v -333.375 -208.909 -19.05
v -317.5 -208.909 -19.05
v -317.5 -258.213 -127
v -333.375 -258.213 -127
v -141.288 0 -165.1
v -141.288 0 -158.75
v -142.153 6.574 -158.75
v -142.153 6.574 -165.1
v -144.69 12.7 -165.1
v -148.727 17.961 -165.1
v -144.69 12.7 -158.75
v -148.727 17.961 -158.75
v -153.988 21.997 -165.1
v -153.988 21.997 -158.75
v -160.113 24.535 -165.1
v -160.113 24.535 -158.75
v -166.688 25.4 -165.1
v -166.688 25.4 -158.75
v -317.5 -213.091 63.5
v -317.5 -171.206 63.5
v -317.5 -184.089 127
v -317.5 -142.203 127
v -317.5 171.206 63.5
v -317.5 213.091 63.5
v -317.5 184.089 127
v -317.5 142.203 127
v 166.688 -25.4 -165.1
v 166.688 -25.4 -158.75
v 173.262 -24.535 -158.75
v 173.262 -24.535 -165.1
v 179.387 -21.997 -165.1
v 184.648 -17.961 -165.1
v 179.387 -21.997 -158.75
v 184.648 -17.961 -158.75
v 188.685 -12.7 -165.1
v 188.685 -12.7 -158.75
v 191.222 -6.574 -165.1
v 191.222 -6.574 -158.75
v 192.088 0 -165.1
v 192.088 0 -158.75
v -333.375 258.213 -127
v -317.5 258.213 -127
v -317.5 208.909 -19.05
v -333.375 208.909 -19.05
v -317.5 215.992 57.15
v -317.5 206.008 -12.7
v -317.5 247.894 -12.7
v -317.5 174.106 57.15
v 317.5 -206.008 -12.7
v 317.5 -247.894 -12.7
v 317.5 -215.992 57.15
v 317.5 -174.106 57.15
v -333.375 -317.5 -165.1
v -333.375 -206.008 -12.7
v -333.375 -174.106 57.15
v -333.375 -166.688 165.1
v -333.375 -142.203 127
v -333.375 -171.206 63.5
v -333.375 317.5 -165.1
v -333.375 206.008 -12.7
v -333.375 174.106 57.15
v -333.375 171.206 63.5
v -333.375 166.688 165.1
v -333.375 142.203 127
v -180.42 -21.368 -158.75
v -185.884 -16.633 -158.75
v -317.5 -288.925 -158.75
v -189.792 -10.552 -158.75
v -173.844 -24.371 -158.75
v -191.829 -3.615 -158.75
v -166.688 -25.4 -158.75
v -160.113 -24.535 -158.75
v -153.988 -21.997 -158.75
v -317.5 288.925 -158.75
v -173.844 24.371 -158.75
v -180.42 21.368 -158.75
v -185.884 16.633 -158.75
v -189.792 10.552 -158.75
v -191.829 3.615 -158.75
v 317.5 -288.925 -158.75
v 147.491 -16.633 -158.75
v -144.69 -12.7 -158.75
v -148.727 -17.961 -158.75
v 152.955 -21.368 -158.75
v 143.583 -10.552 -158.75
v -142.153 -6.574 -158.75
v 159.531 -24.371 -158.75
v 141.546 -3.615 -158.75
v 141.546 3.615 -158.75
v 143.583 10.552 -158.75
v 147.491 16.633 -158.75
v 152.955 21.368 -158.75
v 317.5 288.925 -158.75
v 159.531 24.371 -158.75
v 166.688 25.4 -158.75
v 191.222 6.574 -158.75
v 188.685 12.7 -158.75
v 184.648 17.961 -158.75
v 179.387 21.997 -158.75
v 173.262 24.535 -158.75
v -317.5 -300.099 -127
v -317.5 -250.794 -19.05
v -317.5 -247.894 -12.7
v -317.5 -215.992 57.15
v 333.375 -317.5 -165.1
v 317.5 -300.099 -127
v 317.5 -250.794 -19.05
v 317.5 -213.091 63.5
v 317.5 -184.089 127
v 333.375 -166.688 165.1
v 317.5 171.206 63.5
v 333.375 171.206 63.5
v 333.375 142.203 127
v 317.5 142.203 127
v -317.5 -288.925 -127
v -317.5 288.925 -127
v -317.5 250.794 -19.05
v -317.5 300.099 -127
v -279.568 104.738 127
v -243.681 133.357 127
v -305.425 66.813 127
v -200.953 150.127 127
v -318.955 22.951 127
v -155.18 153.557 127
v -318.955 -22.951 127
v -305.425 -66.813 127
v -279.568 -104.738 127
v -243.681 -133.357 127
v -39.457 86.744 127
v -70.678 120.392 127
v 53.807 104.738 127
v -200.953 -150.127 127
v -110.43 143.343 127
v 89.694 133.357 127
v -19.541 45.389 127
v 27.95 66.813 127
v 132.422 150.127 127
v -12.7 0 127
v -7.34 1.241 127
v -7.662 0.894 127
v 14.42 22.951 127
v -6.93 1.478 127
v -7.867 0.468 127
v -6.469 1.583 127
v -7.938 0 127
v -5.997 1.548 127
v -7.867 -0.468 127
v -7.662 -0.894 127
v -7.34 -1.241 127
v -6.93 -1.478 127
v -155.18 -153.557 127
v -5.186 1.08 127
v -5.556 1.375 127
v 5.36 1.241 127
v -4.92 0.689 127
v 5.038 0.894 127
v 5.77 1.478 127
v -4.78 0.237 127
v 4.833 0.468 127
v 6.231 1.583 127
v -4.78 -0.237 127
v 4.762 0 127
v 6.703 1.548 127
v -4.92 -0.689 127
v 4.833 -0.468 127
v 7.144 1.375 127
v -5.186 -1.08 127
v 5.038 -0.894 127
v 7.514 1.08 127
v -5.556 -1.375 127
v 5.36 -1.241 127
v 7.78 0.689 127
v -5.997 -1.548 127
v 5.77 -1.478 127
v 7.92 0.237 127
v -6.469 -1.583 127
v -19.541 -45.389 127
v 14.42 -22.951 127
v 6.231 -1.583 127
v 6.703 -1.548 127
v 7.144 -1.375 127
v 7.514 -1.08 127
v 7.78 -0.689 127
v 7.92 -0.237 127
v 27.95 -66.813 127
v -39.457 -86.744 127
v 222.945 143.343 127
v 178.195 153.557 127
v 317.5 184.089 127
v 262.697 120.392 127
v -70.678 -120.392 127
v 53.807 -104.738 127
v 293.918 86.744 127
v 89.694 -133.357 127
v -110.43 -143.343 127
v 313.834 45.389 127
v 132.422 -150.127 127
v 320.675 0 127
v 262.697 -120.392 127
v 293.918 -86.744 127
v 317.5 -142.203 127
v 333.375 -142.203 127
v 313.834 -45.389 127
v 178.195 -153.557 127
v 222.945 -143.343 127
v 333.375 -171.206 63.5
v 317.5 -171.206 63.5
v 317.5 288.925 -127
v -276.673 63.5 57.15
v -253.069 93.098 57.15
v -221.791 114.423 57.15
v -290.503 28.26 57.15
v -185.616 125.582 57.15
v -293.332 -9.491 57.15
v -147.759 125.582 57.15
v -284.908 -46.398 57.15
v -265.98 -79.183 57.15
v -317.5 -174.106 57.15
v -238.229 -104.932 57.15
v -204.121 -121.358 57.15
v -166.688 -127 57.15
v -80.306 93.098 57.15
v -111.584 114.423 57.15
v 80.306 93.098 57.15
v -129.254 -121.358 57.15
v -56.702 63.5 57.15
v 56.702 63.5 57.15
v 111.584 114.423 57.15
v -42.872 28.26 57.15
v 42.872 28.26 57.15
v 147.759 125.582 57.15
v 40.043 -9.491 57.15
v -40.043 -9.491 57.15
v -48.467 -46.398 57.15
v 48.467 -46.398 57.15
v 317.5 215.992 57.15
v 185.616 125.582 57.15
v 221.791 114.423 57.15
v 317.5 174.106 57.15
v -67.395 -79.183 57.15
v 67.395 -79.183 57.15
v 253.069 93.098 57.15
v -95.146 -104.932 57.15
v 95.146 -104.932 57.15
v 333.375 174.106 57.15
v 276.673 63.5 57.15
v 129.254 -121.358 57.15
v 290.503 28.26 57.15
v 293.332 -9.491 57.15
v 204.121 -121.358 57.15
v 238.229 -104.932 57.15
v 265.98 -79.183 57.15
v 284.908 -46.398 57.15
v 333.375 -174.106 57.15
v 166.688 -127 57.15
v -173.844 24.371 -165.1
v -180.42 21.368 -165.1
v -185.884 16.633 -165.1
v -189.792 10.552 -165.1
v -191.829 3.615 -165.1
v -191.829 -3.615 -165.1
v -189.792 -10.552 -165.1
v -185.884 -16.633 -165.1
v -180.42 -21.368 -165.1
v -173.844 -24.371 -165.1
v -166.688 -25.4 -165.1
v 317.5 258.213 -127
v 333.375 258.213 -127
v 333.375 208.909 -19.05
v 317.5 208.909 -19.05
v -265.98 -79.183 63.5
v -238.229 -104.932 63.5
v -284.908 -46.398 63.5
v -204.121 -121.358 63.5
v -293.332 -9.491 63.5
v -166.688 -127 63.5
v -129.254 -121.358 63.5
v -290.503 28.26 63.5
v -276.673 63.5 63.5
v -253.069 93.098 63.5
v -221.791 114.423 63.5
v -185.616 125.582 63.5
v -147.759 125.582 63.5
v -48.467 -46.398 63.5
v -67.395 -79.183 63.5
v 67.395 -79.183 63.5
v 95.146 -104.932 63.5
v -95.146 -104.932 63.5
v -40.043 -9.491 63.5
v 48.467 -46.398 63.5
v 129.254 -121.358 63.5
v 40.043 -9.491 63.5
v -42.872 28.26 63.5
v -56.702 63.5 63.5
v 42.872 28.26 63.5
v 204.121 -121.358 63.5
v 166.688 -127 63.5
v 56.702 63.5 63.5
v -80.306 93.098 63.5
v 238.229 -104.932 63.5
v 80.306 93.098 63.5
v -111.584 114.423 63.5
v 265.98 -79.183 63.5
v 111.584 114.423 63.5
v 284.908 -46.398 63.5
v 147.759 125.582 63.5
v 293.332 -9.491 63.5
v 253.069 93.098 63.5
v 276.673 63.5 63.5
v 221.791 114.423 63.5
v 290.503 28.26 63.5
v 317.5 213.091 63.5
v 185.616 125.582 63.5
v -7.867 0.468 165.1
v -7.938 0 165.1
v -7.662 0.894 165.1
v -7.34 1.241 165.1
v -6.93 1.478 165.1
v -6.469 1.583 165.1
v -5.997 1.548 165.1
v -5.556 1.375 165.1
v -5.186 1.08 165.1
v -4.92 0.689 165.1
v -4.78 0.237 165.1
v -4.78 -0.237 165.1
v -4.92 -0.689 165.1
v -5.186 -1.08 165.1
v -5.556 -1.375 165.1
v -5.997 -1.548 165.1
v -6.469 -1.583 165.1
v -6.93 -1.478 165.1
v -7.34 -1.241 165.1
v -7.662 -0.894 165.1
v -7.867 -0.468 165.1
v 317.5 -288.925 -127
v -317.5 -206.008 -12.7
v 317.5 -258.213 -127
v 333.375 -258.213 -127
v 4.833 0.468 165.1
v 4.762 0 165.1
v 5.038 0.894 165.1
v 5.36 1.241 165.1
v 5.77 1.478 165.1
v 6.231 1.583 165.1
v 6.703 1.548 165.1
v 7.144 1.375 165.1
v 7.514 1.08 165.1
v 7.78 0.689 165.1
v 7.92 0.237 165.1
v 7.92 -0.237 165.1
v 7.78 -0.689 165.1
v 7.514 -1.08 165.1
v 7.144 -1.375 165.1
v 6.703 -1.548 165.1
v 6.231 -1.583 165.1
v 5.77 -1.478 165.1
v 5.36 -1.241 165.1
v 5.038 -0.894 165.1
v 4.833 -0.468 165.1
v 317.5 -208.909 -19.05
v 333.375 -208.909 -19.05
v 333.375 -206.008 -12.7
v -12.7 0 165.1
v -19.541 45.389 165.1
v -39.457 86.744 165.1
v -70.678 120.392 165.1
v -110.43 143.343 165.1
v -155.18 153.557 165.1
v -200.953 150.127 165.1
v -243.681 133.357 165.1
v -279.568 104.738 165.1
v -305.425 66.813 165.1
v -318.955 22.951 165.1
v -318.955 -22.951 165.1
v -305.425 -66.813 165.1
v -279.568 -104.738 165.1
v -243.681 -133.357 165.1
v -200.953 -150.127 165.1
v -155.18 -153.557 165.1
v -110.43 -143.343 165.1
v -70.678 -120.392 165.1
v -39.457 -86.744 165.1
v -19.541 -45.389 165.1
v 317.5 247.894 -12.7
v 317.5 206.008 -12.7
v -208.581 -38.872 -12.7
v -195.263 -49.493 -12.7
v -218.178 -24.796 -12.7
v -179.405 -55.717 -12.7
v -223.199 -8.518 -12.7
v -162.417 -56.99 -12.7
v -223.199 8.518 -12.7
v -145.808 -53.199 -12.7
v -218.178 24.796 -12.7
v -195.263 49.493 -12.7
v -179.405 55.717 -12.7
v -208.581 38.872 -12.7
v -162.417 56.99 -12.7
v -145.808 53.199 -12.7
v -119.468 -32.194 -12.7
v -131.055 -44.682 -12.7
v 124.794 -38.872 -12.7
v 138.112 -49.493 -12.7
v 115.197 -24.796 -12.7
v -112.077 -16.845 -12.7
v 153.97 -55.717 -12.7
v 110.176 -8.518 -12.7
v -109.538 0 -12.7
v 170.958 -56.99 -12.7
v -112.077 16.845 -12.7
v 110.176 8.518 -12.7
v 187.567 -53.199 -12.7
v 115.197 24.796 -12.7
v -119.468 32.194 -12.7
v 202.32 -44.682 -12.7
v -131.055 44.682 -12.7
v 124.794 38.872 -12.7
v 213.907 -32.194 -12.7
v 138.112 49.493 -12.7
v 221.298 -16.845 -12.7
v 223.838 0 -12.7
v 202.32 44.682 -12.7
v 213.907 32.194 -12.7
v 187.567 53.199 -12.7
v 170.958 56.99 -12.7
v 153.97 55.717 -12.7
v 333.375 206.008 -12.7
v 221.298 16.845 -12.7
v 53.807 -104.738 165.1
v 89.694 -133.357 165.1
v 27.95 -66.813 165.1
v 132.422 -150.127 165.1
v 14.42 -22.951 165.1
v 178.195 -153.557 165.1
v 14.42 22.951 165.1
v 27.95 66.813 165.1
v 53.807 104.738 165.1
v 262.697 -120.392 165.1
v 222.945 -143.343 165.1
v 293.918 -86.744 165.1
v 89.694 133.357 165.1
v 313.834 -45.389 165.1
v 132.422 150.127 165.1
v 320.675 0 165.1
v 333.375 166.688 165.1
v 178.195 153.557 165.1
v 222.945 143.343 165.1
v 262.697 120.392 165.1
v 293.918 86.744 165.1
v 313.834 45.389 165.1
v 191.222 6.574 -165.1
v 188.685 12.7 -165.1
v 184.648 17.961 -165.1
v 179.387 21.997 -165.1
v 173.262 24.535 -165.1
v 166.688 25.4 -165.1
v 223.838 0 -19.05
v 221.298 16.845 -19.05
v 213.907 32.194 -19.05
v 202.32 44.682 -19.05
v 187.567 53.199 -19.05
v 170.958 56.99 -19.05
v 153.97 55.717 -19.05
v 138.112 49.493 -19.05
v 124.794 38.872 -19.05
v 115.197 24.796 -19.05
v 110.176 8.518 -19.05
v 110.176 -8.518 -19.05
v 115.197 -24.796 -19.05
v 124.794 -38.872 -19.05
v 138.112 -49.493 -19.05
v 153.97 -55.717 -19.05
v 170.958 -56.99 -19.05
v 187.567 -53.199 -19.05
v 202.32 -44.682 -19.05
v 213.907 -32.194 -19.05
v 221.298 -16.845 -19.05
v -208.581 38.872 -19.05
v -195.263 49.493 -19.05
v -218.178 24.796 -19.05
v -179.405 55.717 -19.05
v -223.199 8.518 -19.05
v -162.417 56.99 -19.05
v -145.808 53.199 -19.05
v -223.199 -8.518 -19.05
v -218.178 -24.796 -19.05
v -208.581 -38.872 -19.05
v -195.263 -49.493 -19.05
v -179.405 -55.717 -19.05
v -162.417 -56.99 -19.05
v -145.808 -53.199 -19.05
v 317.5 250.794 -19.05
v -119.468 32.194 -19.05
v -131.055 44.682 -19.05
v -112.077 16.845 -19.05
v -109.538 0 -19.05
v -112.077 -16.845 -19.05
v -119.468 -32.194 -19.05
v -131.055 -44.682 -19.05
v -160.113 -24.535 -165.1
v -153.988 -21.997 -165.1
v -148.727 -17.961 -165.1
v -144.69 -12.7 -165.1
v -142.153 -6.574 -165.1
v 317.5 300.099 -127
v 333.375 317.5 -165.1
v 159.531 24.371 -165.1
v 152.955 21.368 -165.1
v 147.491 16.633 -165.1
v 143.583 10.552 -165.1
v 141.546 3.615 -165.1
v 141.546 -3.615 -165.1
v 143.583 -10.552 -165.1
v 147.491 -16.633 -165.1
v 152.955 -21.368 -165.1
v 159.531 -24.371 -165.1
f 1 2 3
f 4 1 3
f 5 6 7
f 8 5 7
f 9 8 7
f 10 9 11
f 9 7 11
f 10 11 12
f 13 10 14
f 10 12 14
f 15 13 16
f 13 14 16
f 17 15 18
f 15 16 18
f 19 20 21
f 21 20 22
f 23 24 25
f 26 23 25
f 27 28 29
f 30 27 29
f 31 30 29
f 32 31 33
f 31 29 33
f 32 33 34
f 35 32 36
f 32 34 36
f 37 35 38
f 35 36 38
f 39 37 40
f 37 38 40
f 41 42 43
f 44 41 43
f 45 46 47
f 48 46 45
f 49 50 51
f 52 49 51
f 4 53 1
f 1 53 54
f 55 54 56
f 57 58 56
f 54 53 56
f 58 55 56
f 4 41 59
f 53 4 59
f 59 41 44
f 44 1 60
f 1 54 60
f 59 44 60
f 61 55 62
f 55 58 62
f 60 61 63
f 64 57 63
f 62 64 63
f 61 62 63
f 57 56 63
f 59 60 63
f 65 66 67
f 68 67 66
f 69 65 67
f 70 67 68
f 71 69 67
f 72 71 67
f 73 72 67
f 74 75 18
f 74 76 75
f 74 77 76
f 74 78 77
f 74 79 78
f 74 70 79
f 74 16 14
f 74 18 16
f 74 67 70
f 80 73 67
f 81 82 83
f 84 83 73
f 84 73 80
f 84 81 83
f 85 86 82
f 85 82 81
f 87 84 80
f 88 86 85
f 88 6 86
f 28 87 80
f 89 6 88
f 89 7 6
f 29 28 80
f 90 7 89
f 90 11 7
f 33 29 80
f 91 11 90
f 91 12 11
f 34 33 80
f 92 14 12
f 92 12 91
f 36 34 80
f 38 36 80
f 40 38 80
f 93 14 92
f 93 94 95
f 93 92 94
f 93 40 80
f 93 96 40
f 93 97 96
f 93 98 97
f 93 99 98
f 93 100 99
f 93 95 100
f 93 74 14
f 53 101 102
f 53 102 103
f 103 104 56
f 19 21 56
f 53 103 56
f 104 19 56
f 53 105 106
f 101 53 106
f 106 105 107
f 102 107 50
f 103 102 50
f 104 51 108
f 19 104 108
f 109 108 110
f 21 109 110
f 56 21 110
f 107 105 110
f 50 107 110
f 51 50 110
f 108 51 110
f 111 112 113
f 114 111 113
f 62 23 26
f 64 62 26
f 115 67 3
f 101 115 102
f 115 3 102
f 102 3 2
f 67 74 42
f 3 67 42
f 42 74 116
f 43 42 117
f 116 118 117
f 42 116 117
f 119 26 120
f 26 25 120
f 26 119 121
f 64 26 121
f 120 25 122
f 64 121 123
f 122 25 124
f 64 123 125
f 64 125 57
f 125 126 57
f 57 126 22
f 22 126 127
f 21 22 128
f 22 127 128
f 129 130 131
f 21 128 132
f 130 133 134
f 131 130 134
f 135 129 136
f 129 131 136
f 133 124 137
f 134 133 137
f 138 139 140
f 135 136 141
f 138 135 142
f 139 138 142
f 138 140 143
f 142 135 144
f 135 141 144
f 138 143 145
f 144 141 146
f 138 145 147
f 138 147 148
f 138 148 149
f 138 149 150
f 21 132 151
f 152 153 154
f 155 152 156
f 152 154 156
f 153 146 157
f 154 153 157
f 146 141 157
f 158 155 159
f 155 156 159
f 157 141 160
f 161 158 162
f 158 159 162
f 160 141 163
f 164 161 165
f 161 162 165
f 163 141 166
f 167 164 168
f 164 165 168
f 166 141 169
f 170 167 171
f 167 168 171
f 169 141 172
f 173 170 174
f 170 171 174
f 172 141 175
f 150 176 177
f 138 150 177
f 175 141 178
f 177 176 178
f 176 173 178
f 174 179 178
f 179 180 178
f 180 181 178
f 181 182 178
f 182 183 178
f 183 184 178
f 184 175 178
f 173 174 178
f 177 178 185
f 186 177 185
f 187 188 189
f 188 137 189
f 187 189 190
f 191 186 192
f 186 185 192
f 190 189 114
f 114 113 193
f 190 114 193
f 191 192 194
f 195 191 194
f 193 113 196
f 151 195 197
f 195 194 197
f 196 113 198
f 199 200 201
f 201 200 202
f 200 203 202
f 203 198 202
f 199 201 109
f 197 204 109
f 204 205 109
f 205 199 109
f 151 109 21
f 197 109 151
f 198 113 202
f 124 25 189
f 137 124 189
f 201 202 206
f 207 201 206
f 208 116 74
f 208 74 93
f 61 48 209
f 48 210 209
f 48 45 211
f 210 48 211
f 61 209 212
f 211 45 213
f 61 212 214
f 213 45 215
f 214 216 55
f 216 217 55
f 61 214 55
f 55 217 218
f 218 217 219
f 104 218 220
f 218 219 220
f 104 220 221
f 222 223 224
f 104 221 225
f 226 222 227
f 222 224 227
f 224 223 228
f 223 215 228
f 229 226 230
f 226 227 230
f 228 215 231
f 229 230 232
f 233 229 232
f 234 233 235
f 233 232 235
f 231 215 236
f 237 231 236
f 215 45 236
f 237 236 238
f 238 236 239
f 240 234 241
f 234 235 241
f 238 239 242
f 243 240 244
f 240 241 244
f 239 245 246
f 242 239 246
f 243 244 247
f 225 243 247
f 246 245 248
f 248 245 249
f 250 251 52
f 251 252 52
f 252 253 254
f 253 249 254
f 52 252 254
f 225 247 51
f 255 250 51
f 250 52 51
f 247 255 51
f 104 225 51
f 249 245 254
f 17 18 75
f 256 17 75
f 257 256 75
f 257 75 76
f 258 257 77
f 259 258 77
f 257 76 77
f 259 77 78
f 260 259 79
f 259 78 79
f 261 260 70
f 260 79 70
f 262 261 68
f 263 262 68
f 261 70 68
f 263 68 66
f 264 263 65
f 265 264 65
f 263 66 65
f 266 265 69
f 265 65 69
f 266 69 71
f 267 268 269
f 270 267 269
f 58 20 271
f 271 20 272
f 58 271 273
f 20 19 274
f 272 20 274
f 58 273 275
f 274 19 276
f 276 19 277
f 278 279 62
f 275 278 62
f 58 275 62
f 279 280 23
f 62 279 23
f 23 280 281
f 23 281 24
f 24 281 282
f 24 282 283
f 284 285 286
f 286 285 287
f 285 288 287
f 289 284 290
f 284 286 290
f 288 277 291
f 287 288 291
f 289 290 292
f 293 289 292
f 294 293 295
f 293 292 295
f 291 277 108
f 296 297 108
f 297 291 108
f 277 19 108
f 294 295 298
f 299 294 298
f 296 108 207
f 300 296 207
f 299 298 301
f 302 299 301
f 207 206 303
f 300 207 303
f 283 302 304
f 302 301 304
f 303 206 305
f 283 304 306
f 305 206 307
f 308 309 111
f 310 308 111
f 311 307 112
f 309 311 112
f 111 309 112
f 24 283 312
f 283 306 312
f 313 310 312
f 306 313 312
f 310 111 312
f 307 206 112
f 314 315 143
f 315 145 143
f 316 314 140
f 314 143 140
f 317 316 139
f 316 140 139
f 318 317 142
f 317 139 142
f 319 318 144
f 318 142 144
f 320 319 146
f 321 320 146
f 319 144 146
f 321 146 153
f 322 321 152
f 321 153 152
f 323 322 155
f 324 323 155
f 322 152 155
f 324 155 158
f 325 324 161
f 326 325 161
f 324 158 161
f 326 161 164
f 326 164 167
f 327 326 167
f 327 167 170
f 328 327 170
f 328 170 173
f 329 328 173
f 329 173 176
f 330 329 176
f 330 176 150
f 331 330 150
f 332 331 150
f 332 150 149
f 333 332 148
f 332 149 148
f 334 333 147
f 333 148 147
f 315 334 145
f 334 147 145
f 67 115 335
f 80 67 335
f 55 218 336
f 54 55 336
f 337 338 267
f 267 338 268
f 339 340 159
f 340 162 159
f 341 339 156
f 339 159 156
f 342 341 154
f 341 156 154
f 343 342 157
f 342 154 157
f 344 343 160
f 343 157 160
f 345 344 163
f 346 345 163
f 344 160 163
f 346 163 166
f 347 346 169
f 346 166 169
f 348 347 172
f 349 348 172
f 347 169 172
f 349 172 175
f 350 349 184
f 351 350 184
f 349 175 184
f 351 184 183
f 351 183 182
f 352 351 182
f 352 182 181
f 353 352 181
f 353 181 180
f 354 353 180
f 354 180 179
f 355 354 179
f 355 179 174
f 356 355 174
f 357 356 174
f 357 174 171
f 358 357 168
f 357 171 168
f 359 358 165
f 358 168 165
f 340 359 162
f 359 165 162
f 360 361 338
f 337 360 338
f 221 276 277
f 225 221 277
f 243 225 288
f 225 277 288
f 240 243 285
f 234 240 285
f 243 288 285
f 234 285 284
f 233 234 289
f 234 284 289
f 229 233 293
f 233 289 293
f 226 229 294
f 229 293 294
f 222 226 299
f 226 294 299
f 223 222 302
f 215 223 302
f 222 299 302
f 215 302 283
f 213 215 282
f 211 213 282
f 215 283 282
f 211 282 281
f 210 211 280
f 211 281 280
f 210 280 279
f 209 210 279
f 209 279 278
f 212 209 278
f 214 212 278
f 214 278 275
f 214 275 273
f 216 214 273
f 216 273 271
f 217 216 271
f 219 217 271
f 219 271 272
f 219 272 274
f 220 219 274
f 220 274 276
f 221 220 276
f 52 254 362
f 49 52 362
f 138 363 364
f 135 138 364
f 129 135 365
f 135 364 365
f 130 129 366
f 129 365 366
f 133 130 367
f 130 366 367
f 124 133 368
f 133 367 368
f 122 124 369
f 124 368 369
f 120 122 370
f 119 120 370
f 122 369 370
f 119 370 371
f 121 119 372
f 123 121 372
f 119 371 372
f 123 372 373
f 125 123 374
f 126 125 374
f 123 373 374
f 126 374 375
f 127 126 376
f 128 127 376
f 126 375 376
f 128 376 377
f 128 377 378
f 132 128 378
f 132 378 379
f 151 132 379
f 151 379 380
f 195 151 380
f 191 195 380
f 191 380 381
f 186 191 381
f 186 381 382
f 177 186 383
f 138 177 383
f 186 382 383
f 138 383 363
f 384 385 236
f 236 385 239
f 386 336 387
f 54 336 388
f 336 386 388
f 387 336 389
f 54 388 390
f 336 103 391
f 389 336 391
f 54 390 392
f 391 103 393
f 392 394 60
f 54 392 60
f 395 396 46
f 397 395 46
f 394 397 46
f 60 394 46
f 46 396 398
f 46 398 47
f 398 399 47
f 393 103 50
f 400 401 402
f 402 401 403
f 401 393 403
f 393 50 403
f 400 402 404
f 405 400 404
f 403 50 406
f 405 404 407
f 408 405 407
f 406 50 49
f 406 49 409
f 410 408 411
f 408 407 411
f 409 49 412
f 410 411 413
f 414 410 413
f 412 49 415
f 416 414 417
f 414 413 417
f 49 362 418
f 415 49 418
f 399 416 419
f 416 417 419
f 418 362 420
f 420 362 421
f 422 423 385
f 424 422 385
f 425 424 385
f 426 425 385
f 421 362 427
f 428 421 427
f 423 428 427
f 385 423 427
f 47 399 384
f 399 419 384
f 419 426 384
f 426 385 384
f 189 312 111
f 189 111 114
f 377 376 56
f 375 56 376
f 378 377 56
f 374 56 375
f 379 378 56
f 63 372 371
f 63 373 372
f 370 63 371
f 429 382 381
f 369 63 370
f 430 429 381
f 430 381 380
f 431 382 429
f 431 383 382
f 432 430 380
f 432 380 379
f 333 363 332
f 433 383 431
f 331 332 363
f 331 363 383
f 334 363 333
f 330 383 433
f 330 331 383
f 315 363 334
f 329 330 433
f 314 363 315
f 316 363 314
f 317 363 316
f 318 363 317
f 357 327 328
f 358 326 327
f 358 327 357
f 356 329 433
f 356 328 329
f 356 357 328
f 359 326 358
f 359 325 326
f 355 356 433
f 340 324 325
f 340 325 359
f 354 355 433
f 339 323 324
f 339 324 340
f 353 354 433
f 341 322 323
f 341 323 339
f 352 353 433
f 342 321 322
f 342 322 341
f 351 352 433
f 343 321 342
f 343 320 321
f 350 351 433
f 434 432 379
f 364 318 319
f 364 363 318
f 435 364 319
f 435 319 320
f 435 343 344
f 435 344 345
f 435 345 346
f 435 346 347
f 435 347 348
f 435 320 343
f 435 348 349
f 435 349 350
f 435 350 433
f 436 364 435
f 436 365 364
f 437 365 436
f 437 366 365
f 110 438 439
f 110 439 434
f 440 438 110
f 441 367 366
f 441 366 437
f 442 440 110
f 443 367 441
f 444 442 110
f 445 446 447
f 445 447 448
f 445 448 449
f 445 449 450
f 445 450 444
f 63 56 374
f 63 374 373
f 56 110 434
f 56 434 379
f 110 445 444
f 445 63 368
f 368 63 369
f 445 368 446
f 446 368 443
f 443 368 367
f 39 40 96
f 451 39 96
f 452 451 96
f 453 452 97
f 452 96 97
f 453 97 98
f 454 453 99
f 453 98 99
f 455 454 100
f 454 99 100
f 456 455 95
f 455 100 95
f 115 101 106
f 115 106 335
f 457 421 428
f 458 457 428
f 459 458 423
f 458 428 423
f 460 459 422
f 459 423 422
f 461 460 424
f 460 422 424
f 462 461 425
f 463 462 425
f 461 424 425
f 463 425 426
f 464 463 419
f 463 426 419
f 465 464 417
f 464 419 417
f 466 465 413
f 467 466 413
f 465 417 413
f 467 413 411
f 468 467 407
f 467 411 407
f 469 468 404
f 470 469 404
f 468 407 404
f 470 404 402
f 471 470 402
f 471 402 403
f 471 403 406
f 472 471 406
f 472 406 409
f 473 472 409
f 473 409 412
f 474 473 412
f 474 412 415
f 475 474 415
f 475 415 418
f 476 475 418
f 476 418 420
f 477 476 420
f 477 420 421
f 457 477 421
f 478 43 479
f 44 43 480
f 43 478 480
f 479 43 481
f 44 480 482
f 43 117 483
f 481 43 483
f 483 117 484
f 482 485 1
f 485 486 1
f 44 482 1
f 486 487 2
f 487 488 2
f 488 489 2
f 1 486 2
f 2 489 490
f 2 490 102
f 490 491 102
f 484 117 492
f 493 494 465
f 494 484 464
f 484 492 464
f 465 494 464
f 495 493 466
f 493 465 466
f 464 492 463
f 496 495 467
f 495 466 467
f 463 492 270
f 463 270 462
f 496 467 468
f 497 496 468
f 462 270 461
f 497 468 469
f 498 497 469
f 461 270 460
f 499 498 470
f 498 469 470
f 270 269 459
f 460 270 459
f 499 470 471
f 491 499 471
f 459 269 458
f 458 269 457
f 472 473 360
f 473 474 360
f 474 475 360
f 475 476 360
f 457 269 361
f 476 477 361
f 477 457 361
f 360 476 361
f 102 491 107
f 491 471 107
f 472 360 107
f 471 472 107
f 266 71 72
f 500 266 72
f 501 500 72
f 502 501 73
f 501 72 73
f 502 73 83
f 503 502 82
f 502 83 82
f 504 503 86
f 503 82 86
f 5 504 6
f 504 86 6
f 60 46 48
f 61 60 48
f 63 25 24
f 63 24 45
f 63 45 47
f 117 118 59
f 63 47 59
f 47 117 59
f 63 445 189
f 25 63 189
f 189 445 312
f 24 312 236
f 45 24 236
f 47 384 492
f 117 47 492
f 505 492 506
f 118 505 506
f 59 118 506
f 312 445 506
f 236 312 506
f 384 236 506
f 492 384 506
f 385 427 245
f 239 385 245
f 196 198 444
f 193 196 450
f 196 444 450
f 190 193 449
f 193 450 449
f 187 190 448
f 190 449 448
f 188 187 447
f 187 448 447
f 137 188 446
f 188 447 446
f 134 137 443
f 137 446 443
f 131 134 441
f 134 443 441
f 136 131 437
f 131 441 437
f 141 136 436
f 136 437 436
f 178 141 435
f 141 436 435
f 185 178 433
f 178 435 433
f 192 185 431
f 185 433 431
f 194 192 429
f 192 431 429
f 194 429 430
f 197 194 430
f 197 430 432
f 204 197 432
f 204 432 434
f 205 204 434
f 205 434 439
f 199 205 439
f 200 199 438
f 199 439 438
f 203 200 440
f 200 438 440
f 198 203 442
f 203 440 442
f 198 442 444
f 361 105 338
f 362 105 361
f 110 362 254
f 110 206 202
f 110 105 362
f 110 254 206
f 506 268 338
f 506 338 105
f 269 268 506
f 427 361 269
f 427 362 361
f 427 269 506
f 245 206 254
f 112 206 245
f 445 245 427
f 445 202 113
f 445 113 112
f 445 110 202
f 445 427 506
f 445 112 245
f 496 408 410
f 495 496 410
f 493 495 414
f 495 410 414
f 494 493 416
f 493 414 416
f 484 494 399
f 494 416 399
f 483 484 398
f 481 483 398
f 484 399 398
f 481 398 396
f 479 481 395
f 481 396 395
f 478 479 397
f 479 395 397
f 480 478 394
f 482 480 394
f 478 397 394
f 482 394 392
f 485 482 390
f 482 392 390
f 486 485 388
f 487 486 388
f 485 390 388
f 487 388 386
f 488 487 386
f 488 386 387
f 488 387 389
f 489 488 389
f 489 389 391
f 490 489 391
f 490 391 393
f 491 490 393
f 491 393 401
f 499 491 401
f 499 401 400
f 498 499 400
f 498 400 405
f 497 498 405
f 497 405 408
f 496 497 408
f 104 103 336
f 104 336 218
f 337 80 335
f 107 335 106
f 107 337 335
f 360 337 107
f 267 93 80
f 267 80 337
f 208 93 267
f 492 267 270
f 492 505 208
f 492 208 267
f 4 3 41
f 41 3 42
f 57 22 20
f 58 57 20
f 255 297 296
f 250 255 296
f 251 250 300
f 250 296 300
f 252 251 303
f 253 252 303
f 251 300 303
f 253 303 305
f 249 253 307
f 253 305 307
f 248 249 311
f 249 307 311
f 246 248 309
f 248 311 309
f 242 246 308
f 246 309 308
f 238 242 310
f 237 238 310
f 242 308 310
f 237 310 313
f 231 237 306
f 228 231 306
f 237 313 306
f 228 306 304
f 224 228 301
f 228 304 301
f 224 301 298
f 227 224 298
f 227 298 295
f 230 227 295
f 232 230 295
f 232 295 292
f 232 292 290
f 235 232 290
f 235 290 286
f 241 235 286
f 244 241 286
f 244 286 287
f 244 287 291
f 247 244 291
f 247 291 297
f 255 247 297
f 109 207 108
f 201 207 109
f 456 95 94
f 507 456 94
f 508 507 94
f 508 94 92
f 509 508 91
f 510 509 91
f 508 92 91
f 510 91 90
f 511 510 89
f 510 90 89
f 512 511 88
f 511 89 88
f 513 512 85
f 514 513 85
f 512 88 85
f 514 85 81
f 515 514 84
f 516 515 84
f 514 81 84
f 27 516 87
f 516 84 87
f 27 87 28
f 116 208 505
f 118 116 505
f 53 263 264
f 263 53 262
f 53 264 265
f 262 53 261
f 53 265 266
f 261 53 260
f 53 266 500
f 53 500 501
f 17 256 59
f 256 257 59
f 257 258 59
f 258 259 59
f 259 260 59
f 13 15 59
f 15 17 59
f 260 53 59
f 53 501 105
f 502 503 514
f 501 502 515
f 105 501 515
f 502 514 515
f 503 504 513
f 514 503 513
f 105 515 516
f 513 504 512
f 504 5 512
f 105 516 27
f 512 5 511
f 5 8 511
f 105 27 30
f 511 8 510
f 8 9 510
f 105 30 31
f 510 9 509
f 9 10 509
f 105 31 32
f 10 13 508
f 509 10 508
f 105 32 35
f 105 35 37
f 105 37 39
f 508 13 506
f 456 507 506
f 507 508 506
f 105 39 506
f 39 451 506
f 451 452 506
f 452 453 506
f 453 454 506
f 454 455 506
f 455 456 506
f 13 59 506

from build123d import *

# Parameters (mm, degrees)
F0_W      = 666.75
F0_H      = 635
F1_DEPTH  = 165.1
F4_W      = 333.375
F4_H      = 69.85
F5_DEPTH  = 666.751
F6_W      = 635
F6_H      = 63.5
F6_H_2    = 107.95
F6_H_3    = 69.85
F7_DEPTH  = 330.2
F9_DEPTH  = 38.1
F11_DEPTH = 25.4
F13_DEPTH = 25.4
F14_W     = 635
F14_H     = 577.849984169
F15_DEPTH = 31.75
F17_DEPTH = 25.4
F19_D     = 3.175
F19_DEPTH = 38.1
F19_TIP   = 0.9538662327


with BuildPart() as f1:
    # F0 (on Top) → F1 (new body, symmetric)
    with BuildSketch(Plane.XY):
        Rectangle(F0_W, F0_H)
    extrude(amount=F1_DEPTH, both=True)

    # F4 (on face) → F5 (cut, through all)
    with BuildSketch(Plane.YZ.offset(333.375)):
        Polygon((0, 127), (-142.2031428718, 127), (-166.6875, 73.3921443929), (-166.6875, 63.5), (166.6875, 63.5), (166.6875, 73.3921443929), (142.2031428718, 127), align=None)
        Polygon((-166.6875, 63.5), (-166.6875, 73.3921443929), (-171.2055467179, 63.5), align=None)
        Polygon((171.2055467179, 63.5), (166.6875, 73.3921443929), (166.6875, 63.5), align=None)
        Polygon((174.1057871025, 57.15), (166.6875, 57.15), (166.6875, -12.7), (206.0084313333, -12.7), align=None)
        with Locations((0, 22.225)):
            Rectangle(F4_W, F4_H)
        Polygon((-166.6875, -12.7), (-166.6875, 57.15), (-174.1057871025, 57.15), (-206.0084313333, -12.7), align=None)
        Polygon((-208.9086717179, -19.05), (-258.2127582564, -127), (-166.6875, -127), (-166.6875, -19.05), align=None)
        Polygon((-166.6875, -19.05), (-166.6875, -127), (0, -127), (166.6875, -127), (166.6875, -19.05), align=None)
        Polygon((166.6875, -19.05), (166.6875, -127), (258.2127582564, -127), (208.9086717179, -19.05), align=None)
        Polygon((317.5, 165.1), (166.6875, 165.1), (184.0889423077, 127), (213.0913461538, 63.5), (317.5, -165.1), align=None)
        Polygon((-184.0889423077, 127), (-166.6875, 165.1), (-317.5, 165.1), (-317.5, -165.1), (-213.0913461538, 63.5), align=None)
    extrude(amount=-F5_DEPTH, mode=Mode.SUBTRACT)

    # F6 (on Front) → F7 (cut, symmetric)
    with BuildSketch(Plane.XZ):
        with Locations((0, 95.25)):
            Rectangle(F6_W, F6_H)
        with Locations((0, -73.025)):
            Rectangle(F6_W, F6_H_2)
        with Locations((0, 22.225)):
            Rectangle(F6_W, F6_H_3)
    extrude(amount=F7_DEPTH, both=True, mode=Mode.SUBTRACT)

    # F3 (on face) + F8 (on face) → F9 (cut)
    with BuildSketch(Plane.XY.offset(165.1)):
        with BuildLine():
            ThreePointArc((-166.6875, 153.9875), (-320.675, 0), (-166.6875, -153.9875))
            Line((-166.6875, -153.9875), (-166.6875, 153.9875))
        make_face()
        with BuildLine():
            Line((-166.6875, 153.9875), (-166.6875, -153.9875))
            ThreePointArc((-166.6875, -153.9875), (-57.801894532, -108.885605468), (-12.7, 0))
            ThreePointArc((-12.7, 0), (-57.801894532, 108.885605468), (-166.6875, 153.9875))
        make_face()
        with BuildLine():
            ThreePointArc((166.6875, 153.9875), (12.7, 0), (166.6875, -153.9875))
            Line((166.6875, -153.9875), (166.6875, 153.9875))
        make_face()
    with BuildSketch(Plane.XY.offset(165.1)):
        with BuildLine():
            Line((166.6875, 153.9875), (166.6875, -153.9875))
            ThreePointArc((166.6875, -153.9875), (275.573105468, -108.885605468), (320.675, 0))
            ThreePointArc((320.675, 0), (275.573105468, 108.885605468), (166.6875, 153.9875))
        make_face()
    extrude(amount=-F9_DEPTH, mode=Mode.SUBTRACT)

    # F10 (on face) → F11 (cut)
    with BuildSketch(Plane.XY.offset(63.5)):
        with BuildLine():
            ThreePointArc((-166.6875, 127), (-293.6875, 0), (-166.6875, -127))
            Line((-166.6875, -127), (-166.6875, 127))
        make_face()
        with BuildLine():
            Line((-166.6875, 127), (-166.6875, -127))
            ThreePointArc((-166.6875, -127), (-76.8849387893, -89.8025612107), (-39.6875, 0))
            ThreePointArc((-39.6875, 0), (-76.8849387893, 89.8025612107), (-166.6875, 127))
        make_face()
        with BuildLine():
            ThreePointArc((166.6875, 127), (39.6875, 0), (166.6875, -127))
            Line((166.6875, -127), (166.6875, 127))
        make_face()
        with BuildLine():
            Line((166.6875, 127), (166.6875, -127))
            ThreePointArc((166.6875, -127), (256.4900612107, -89.8025612107), (293.6875, 0))
            ThreePointArc((293.6875, 0), (256.4900612107, 89.8025612107), (166.6875, 127))
        make_face()
    extrude(amount=-F11_DEPTH, mode=Mode.SUBTRACT)

    # F12 (on face) → F13 (cut)
    with BuildSketch(Plane.XY.offset(-12.7)):
        with BuildLine():
            ThreePointArc((-166.6875, 57.15), (-223.8375, 0), (-166.6875, -57.15))
            Line((-166.6875, -57.15), (-166.6875, 57.15))
        make_face()
        with BuildLine():
            Line((-166.6875, 57.15), (-166.6875, -57.15))
            ThreePointArc((-166.6875, -57.15), (-126.2763474552, -40.4111525448), (-109.5375, 0))
            ThreePointArc((-109.5375, 0), (-126.2763474552, 40.4111525448), (-166.6875, 57.15))
        make_face()
        with BuildLine():
            ThreePointArc((166.6875, 57.15), (109.5375, 0), (166.6875, -57.15))
            Line((166.6875, -57.15), (166.6875, 57.15))
        make_face()
        with BuildLine():
            Line((166.6875, 57.15), (166.6875, -57.15))
            ThreePointArc((166.6875, -57.15), (207.0986525448, -40.4111525448), (223.8375, 0))
            ThreePointArc((223.8375, 0), (207.0986525448, 40.4111525448), (166.6875, 57.15))
        make_face()
    extrude(amount=-F13_DEPTH, mode=Mode.SUBTRACT)

    # F14 (on face) → F15 (cut)
    with BuildSketch(Plane.XY.offset(-127)):
        Rectangle(F14_W, F14_H)
    extrude(amount=-F15_DEPTH, mode=Mode.SUBTRACT)

    # F16 (on face) → F17 (cut)
    with BuildSketch(Plane.XY.offset(-158.75)):
        with BuildLine():
            ThreePointArc((-166.6875, 25.4), (-192.0875, 0), (-166.6875, -25.4))
            Line((-166.6875, -25.4), (-166.6875, 25.4))
        make_face()
        with BuildLine():
            Line((-166.6875, 25.4), (-166.6875, -25.4))
            ThreePointArc((-166.6875, -25.4), (-148.7269877579, -17.9605122421), (-141.2875, 0))
            ThreePointArc((-141.2875, 0), (-148.7269877579, 17.9605122421), (-166.6875, 25.4))
        make_face()
        with BuildLine():
            Line((166.6875, 25.4), (166.6875, -25.4))
            ThreePointArc((166.6875, -25.4), (184.6480122421, -17.9605122421), (192.0875, 0))
            ThreePointArc((192.0875, 0), (184.6480122421, 17.9605122421), (166.6875, 25.4))
        make_face()
        with BuildLine():
            ThreePointArc((166.6875, 25.4), (141.2875, 0), (166.6875, -25.4))
            Line((166.6875, -25.4), (166.6875, 25.4))
        make_face()
    extrude(amount=-F17_DEPTH, mode=Mode.SUBTRACT)

    # F19
    with Locations(Plane.XY.offset(165.1)):
        with Locations((-6.35, 0), (6.35, 0)):
            Hole(F19_D / 2, depth=F19_DEPTH)
            with Locations((0, 0, -(F19_DEPTH + F19_TIP / 2))):  # 118° drill point
                Cone(0, F19_D / 2, F19_TIP, mode=Mode.SUBTRACT)


solid = f1.part
